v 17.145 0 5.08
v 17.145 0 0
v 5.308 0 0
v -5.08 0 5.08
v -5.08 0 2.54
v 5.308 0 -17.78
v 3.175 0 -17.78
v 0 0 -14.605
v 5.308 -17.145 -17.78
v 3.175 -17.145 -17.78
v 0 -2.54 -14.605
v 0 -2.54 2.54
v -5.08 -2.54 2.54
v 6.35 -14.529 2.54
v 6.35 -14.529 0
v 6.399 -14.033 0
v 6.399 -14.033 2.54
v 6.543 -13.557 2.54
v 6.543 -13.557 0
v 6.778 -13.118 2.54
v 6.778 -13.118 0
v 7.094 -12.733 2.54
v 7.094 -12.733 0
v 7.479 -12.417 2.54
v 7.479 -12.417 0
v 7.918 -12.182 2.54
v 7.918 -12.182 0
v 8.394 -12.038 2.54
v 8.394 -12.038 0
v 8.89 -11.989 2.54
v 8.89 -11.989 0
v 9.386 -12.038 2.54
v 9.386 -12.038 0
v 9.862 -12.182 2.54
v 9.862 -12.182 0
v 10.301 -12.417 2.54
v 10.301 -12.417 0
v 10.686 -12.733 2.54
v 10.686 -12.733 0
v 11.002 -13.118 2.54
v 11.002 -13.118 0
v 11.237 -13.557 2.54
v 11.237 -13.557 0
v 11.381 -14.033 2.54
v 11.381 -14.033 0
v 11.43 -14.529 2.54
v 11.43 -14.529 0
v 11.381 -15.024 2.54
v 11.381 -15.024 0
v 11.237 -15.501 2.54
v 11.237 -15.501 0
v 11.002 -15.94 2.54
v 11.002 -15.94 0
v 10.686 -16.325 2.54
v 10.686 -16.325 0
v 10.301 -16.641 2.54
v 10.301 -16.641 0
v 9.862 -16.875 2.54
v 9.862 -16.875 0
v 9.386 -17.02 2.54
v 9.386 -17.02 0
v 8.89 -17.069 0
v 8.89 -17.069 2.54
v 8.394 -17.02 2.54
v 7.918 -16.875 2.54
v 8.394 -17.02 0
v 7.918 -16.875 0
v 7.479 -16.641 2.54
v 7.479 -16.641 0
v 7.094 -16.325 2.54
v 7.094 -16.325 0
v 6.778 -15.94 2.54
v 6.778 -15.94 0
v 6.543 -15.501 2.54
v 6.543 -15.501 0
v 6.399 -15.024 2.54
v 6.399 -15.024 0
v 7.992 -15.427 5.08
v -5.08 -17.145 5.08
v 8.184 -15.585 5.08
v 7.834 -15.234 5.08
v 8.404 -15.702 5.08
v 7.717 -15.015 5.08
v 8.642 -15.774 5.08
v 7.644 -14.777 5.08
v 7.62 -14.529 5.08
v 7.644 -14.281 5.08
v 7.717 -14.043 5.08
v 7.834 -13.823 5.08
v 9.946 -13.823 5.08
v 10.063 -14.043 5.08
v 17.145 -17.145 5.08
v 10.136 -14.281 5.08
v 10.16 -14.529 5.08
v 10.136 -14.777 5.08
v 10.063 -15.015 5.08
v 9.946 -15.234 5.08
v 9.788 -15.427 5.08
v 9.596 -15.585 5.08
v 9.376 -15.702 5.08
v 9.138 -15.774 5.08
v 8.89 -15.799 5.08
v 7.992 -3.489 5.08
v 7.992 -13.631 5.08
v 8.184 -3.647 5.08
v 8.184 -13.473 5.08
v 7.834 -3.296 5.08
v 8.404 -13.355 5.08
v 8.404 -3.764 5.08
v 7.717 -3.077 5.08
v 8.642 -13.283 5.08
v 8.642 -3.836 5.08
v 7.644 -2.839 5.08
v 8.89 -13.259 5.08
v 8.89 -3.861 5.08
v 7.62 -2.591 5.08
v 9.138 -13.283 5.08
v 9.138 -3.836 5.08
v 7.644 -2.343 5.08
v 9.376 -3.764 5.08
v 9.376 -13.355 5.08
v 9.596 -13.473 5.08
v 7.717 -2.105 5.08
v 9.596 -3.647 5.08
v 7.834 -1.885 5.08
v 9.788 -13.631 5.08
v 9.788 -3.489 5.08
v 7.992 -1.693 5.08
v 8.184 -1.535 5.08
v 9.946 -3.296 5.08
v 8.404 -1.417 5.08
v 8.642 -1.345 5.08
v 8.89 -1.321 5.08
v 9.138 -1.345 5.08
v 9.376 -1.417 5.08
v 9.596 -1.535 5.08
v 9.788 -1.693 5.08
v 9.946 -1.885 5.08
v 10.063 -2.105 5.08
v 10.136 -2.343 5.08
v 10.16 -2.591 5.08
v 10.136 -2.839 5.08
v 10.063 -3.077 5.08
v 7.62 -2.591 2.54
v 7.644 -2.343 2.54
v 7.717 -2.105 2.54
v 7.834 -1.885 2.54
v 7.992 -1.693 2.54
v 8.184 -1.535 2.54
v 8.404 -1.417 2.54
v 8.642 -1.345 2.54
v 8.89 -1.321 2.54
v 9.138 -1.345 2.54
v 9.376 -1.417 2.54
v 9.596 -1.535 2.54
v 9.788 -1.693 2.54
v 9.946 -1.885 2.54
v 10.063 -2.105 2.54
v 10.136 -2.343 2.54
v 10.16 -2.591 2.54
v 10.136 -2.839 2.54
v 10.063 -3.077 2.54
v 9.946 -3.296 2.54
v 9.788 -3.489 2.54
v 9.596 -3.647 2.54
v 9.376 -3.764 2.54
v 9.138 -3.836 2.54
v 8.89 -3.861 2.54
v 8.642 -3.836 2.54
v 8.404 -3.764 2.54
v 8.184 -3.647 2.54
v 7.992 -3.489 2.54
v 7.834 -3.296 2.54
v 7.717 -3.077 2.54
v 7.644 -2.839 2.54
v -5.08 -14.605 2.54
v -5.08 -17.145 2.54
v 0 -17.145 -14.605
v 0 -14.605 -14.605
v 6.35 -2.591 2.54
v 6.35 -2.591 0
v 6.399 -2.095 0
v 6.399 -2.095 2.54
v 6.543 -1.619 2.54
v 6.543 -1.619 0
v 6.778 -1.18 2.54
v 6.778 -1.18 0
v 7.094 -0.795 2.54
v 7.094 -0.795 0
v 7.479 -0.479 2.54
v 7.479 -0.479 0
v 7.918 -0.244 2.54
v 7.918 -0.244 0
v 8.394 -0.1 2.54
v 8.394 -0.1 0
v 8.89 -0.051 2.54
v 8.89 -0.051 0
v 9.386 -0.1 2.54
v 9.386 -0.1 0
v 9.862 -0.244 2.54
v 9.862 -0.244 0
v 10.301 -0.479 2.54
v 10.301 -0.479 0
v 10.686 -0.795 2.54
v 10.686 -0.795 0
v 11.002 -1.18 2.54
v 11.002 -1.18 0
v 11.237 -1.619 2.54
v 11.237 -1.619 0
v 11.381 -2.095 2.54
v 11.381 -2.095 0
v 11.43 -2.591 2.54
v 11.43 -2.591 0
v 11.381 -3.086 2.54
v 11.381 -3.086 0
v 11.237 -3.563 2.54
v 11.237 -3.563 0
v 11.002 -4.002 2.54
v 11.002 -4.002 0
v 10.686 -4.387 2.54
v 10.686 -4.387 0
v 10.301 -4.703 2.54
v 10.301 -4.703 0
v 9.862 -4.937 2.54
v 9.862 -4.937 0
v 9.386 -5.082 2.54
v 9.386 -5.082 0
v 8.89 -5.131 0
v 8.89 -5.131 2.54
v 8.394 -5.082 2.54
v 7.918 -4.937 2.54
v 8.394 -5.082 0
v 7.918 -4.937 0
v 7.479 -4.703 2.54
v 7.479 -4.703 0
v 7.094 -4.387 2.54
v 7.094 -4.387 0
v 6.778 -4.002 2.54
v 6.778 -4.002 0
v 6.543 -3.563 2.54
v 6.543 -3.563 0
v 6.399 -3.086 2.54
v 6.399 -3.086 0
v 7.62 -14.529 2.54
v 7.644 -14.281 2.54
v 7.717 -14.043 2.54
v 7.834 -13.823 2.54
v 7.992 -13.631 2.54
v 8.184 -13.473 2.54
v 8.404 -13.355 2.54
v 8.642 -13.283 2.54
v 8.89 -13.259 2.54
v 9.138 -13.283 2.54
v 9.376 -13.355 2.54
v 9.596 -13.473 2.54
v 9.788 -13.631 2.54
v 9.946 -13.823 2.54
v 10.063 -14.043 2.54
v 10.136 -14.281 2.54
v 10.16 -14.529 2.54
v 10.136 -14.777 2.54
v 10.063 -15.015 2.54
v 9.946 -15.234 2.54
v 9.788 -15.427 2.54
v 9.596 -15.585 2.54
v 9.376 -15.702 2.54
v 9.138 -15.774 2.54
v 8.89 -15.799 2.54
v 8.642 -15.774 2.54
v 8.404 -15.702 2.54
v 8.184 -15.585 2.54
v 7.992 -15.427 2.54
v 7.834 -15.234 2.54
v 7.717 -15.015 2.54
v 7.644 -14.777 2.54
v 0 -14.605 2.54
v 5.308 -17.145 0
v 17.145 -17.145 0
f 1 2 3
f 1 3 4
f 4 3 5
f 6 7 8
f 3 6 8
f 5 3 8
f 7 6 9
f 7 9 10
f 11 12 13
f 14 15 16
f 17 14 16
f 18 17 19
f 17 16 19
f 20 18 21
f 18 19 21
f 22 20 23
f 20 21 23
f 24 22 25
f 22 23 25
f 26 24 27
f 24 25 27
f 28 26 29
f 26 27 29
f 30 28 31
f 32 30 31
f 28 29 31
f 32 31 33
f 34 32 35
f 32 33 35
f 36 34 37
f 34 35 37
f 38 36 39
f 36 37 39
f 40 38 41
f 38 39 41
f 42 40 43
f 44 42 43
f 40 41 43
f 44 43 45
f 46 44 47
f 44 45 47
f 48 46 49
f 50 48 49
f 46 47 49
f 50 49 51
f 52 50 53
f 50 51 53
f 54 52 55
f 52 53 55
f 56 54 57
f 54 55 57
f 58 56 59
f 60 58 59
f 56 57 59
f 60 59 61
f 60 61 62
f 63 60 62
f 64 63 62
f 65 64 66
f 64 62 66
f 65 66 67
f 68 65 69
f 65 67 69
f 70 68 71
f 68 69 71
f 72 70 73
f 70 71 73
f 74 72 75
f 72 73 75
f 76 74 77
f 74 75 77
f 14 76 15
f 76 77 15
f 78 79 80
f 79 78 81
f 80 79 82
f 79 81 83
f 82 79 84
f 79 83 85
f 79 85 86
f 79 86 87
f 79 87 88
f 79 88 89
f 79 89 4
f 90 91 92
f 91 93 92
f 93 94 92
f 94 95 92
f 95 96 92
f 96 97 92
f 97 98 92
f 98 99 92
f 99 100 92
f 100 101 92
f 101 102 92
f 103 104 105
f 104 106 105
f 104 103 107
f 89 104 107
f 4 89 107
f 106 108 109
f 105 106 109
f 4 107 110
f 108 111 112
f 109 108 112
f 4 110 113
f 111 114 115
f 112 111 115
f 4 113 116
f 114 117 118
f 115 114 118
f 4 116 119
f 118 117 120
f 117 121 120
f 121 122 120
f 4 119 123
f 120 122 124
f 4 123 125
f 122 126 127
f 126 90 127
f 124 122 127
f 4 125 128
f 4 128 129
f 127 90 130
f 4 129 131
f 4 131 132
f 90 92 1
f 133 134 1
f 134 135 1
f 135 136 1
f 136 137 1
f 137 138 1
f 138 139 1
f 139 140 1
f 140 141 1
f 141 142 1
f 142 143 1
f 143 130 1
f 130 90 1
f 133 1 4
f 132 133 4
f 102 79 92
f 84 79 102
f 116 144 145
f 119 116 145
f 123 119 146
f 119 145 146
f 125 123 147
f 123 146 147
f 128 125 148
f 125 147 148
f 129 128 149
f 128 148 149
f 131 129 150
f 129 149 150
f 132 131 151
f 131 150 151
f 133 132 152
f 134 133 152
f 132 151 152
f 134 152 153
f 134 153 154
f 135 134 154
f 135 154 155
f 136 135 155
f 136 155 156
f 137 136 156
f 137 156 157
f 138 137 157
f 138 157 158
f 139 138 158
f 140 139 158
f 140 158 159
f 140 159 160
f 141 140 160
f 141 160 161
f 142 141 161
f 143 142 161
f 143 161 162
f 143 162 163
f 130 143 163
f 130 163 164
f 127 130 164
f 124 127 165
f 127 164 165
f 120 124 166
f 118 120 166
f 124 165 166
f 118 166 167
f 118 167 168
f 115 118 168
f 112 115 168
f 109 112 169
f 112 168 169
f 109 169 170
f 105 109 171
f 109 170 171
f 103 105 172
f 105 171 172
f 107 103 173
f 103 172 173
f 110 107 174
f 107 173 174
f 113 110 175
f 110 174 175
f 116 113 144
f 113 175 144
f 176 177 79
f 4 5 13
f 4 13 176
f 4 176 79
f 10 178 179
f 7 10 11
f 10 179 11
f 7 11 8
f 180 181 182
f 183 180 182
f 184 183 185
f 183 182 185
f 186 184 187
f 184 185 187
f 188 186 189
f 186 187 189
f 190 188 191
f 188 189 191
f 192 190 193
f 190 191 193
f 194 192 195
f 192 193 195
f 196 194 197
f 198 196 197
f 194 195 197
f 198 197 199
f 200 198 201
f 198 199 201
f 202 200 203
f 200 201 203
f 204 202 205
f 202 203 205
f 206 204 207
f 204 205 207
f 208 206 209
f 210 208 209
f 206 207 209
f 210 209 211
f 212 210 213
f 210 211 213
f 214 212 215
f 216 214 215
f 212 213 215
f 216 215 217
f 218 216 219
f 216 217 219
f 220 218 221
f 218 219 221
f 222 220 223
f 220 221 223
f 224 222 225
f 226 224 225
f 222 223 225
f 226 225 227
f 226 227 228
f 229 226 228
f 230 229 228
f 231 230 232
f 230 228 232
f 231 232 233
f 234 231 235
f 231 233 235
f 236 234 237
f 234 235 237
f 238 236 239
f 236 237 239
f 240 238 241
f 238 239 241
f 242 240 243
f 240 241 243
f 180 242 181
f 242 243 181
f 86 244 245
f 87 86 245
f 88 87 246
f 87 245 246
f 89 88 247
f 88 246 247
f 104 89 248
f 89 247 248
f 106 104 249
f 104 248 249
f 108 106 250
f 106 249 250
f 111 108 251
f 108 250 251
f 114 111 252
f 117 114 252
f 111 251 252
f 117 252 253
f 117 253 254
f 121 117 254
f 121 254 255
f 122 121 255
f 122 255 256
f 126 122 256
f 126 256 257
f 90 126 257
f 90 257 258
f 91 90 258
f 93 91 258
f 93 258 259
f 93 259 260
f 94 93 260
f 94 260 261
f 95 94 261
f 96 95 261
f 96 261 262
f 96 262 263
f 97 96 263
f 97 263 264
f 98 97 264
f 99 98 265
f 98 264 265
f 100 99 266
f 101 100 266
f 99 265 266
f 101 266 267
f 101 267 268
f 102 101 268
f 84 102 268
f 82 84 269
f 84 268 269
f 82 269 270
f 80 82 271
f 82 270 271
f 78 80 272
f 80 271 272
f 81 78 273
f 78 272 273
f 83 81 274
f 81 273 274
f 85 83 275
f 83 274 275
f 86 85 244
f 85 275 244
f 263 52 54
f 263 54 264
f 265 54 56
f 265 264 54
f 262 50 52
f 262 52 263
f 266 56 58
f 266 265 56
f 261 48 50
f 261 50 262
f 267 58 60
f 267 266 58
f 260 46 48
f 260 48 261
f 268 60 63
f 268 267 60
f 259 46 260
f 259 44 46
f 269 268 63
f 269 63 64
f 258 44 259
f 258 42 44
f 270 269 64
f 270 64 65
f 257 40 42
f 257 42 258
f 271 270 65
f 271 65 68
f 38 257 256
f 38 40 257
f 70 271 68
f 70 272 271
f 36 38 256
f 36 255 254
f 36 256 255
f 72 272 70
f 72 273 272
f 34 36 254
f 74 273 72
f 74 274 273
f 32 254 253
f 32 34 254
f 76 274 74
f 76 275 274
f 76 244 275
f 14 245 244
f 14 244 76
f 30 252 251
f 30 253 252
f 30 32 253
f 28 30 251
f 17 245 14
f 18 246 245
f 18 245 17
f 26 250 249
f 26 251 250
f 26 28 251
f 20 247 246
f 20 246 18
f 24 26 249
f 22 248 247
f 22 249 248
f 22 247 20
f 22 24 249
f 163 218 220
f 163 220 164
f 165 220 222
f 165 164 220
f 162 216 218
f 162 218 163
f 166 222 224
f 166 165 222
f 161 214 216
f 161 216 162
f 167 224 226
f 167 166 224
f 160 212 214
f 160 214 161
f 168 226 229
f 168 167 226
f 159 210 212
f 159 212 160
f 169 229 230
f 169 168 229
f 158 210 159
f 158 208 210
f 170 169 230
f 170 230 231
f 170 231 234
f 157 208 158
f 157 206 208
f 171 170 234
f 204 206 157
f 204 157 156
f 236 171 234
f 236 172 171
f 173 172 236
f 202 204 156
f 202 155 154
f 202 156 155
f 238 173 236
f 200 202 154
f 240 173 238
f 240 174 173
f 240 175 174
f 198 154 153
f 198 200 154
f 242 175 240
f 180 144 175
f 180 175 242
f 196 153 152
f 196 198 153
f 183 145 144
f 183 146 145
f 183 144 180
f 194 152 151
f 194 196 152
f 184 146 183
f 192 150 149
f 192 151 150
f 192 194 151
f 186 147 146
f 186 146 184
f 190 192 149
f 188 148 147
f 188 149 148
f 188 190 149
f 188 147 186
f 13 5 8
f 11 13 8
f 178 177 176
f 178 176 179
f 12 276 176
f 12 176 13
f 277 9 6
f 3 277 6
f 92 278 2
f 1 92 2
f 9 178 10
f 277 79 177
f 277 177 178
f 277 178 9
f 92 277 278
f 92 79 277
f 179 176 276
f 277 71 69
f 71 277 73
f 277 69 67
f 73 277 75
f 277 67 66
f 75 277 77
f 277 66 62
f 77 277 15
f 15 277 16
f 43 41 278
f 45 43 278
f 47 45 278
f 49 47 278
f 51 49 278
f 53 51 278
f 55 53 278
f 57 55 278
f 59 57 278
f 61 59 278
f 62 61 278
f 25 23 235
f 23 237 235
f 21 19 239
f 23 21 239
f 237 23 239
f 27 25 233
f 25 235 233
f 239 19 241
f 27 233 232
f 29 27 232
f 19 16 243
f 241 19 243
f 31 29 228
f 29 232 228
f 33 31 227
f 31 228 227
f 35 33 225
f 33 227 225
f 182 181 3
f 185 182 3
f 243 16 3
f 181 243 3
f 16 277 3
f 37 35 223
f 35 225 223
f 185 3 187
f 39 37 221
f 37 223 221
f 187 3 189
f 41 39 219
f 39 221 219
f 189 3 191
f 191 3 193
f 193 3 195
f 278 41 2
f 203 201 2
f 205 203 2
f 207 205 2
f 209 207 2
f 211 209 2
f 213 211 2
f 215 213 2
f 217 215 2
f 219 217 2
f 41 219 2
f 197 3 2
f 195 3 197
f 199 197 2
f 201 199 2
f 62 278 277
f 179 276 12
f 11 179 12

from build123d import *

# Parameters (mm, degrees)
SKETCH1_W           = 17.145
SKETCH1_H           = 17.145
BOSS_EXTRUDE1_DEPTH = 5.08
SKETCH2_R           = 1.27
CUT_EXTRUDE1_DEPTH  = 6.08
SKETCH3_R           = 2.54
CUT_EXTRUDE4_DEPTH  = 2.54
SKETCH4_W           = 6.307704678
SKETCH4_H           = 17.145
BOSS_EXTRUDE2_DEPTH = 17.78
SKETCH5_W           = 2.54
SKETCH5_H           = 17.145
BOSS_EXTRUDE3_DEPTH = 5.08
CHAMFER1_SIZE       = 3.175
BOSS_EXTRUDE4_DEPTH = 2.54
BOSS_EXTRUDE5_DEPTH = 2.54
SKETCH9_W           = 1
SKETCH9_H           = 17.145
CUT_EXTRUDE5_DEPTH  = 17.78


with BuildPart() as part:
    # Sketch1 → Boss-Extrude1 (new body)
    with BuildSketch(Plane.XY):
        with Locations((8.5725, -8.5725)):
            Rectangle(SKETCH1_W, SKETCH1_H)
    extrude(amount=BOSS_EXTRUDE1_DEPTH)

    # Sketch2 → Cut-Extrude1 (cut, through all)
    with BuildSketch(Plane(origin=(0, 0, 0), x_dir=(-1, 0, 0), z_dir=(0, 0, -1))):
        with Locations((-8.89, -2.5908)):
            Circle(SKETCH2_R)
        with Locations((-8.89, -14.5288)):
            Circle(SKETCH2_R)
    extrude(amount=-CUT_EXTRUDE1_DEPTH, mode=Mode.SUBTRACT)

    # Sketch3 → Cut-Extrude4 (cut)
    with BuildSketch(Plane(origin=(0, 0, 0), x_dir=(-1, 0, 0), z_dir=(0, 0, -1))):
        with Locations((-8.89, -2.5908)):
            Circle(SKETCH3_R)
        with Locations((-8.89, -14.5288)):
            Circle(SKETCH3_R)
    extrude(amount=-CUT_EXTRUDE4_DEPTH, mode=Mode.SUBTRACT)

    # Sketch4 → Boss-Extrude2 (add)
    with BuildSketch(Plane(origin=(0, 0, 0), x_dir=(-1, 0, 0), z_dir=(0, 0, -1))):
        with Locations((-3.153852339, -8.5725)):
            Rectangle(SKETCH4_W, SKETCH4_H)
    extrude(amount=BOSS_EXTRUDE2_DEPTH)

    # Sketch5 → Boss-Extrude3 (add)
    with BuildSketch(Plane.ZY):
        with Locations((3.81, -8.5725)):
            Rectangle(SKETCH5_W, SKETCH5_H)
    extrude(amount=BOSS_EXTRUDE3_DEPTH)

    # Chamfer1
    chamfer1_edges = [part.edges().sort_by_distance(p)[0] for p in [
        (0, -8.5725, -17.78),
    ]]
    chamfer(chamfer1_edges, length=CHAMFER1_SIZE)

    # Sketch7 → Boss-Extrude4 (add)
    with BuildSketch(Plane(origin=(0, 0, 0), x_dir=(1, 0, 0), z_dir=(0, 1, 0))):
        Polygon((-5.08, -2.54), (0, 14.605), (0, -2.54), align=None)
    extrude(amount=-BOSS_EXTRUDE4_DEPTH)

    # Sketch8 → Boss-Extrude5 (add)
    with BuildSketch(Plane.XZ.offset(17.145)):
        Polygon((0, 2.54), (-5.08, 2.54), (0, -14.605), align=None)
    extrude(amount=-BOSS_EXTRUDE5_DEPTH)

    # Sketch9 → Cut-Extrude5 (cut)
    with BuildSketch(Plane(origin=(0, 0, -17.78), x_dir=(-1, 0, 0), z_dir=(0, 0, -1))):
        with Locations((-5.807704678, -8.5725)):
            Rectangle(SKETCH9_W, SKETCH9_H)
    extrude(amount=-CUT_EXTRUDE5_DEPTH, mode=Mode.SUBTRACT)


solid = part.part
